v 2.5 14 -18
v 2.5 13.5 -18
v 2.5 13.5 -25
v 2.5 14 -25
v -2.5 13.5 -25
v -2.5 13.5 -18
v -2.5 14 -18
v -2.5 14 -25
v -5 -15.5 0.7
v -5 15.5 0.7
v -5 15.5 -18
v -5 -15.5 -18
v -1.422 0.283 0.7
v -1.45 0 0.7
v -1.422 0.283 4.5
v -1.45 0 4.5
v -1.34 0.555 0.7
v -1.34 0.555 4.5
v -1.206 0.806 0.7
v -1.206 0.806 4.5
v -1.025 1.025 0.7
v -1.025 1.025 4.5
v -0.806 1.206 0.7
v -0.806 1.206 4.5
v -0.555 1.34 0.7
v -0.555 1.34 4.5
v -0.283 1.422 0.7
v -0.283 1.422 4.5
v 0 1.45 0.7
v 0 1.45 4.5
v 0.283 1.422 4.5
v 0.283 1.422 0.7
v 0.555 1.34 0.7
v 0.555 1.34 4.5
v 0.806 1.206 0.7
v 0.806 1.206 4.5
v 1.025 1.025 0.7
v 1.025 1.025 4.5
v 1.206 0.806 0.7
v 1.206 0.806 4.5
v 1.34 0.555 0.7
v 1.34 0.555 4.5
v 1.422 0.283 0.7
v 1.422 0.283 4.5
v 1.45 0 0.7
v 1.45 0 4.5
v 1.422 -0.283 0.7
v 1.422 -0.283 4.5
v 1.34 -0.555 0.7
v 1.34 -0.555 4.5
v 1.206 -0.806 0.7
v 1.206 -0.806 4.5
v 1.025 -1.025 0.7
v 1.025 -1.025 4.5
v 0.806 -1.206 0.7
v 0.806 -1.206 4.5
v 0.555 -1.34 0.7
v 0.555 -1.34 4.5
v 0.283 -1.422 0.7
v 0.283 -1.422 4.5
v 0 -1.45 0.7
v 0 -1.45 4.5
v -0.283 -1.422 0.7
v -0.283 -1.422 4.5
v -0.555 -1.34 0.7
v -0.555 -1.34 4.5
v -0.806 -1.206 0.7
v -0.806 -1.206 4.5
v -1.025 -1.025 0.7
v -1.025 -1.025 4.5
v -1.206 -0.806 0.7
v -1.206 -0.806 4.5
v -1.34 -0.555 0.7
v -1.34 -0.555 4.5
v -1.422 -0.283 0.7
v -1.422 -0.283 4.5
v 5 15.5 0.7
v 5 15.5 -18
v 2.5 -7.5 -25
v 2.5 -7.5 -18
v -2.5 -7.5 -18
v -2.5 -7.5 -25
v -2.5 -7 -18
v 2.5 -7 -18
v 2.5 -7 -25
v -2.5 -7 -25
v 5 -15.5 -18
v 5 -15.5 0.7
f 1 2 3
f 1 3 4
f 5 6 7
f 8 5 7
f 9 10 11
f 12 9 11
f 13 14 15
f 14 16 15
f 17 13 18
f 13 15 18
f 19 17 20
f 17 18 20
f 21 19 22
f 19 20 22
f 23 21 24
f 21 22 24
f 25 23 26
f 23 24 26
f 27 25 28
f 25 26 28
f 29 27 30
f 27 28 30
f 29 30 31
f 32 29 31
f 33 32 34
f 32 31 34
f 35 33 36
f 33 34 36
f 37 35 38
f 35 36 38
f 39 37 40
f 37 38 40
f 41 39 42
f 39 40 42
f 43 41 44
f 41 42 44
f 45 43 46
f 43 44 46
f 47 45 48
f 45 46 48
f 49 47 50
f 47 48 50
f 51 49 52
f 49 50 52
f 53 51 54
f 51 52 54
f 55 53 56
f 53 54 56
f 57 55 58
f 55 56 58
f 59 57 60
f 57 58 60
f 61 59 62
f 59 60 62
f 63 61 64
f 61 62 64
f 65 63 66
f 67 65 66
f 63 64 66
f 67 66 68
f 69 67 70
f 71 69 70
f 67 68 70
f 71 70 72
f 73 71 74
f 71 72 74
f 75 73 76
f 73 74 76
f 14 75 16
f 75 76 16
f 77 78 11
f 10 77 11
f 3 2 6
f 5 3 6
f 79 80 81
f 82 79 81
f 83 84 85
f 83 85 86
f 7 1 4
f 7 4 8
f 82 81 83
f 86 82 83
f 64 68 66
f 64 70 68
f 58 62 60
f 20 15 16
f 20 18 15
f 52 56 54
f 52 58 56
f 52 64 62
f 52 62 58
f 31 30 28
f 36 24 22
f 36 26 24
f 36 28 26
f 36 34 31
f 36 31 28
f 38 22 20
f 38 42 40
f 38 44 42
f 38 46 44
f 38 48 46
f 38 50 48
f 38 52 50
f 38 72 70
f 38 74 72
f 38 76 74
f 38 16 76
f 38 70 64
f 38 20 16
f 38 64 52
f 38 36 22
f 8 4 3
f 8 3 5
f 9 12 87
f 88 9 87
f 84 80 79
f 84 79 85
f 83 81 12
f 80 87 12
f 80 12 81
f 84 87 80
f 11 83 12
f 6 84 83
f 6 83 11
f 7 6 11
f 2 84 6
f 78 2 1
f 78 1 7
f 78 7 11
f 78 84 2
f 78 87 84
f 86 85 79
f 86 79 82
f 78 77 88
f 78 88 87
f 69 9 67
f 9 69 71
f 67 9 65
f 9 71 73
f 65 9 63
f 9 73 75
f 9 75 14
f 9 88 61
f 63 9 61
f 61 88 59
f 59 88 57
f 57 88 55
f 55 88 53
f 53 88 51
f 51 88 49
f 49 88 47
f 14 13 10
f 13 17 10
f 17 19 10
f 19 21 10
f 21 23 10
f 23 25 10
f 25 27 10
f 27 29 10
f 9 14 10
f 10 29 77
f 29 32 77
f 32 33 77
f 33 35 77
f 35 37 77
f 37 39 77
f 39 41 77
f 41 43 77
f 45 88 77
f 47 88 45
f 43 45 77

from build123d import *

# Parameters (mm, degrees)
SKETCH1_W                      = 18.7
SKETCH1_H                      = 46
BOSS_EXTRUDE1_DEPTH            = 10
SKETCH2_W                      = 18
SKETCH2_H                      = 7.5
CUT_EXTRUDE1_DEPTH             = 31.870698081
SKETCH3_W                      = 18
SKETCH3_H                      = 7.5
CUT_EXTRUDE2_DEPTH             = 31.870698081
SKETCH4_W                      = 5
SKETCH4_H                      = 0.5
BOSS_EXTRUDE2_DEPTH            = 7
SKETCH5_W                      = 5
SKETCH5_H                      = 0.5
BOSS_EXTRUDE3_DEPTH            = 7
SKETCH6_W                      = 1.45
SKETCH6_H                      = 3.8
F_2_5_2_5_DIAMETER_HOLE1_D     = 2.5
F_2_5_2_5_DIAMETER_HOLE1_DEPTH = 25.7
FILLET1_R                      = 0.5
CUT_EXTRUDE3_DEPTH             = 35.336569427
CUT_EXTRUDE3_DEPTH_BACK        = 35.336569427


with BuildPart() as part:
    # Sketch1 → Boss-Extrude1 (new body)
    with BuildSketch(Plane(origin=(5, 0, 0), x_dir=(0, 0, -1), z_dir=(1, 0, 0))):
        with Locations((8.65, 0)):
            Rectangle(SKETCH1_W, SKETCH1_H)
    extrude(amount=-BOSS_EXTRUDE1_DEPTH)

    # Sketch2 → Cut-Extrude1 (cut, through all)
    with BuildSketch(Plane.ZY.offset(5)):
        with Locations((-9, -19.25)):
            Rectangle(SKETCH2_W, SKETCH2_H)
    extrude(amount=-CUT_EXTRUDE1_DEPTH, mode=Mode.SUBTRACT)

    # Sketch3 → Cut-Extrude2 (cut, through all)
    with BuildSketch(Plane.ZY.offset(5)):
        with Locations((-9, 19.25)):
            Rectangle(SKETCH3_W, SKETCH3_H)
    extrude(amount=-CUT_EXTRUDE2_DEPTH, mode=Mode.SUBTRACT)

    # Sketch4 → Boss-Extrude2 (add)
    with BuildSketch(Plane(origin=(0, 0, -18), x_dir=(-1, 0, 0), z_dir=(0, 0, -1))):
        with Locations((0, -7.25)):
            Rectangle(SKETCH4_W, SKETCH4_H)
    extrude(amount=BOSS_EXTRUDE2_DEPTH)

    # Sketch5 → Boss-Extrude3 (add)
    with BuildSketch(Plane(origin=(0, 0, -18), x_dir=(-1, 0, 0), z_dir=(0, 0, -1))):
        with Locations((0, 13.75)):
            Rectangle(SKETCH5_W, SKETCH5_H)
    extrude(amount=BOSS_EXTRUDE3_DEPTH)

    # Sketch6 → Revolve1 (revolve)
    with BuildSketch(Plane.XZ, mode=Mode.PRIVATE) as revolve1_sk:
        with Locations((0.725, 2.6)):
            Rectangle(SKETCH6_W, SKETCH6_H)
    revolve(revolve1_sk.sketch.rotate(Axis((0, 0, 4.5), (0, 0, -1)), 180), axis=Axis((0, 0, 4.5), (0, 0, -1)))

    # Ø2.5 (2.5) Diameter Hole1
    with Locations(Plane.XY.offset(0.7)):
        with Locations((0, -21), (0, 21)):
            Hole(F_2_5_2_5_DIAMETER_HOLE1_D / 2, depth=F_2_5_2_5_DIAMETER_HOLE1_DEPTH)

    # Fillet1
    fillet1_edges = [part.edges().sort_by_distance(p)[0] for p in [
        (5, 23, 0.35),
        (-5, 23, 0.35),
        (-5, -23, 0.35),
        (5, -23, 0.35),
    ]]
    fillet(fillet1_edges, radius=FILLET1_R)

    # Sketch9 → Cut-Extrude3 (cut, two sides: drawn at the far end of the back side and taken through both)
    with BuildSketch(Plane(origin=(0, 0, 0), x_dir=(-1, 0, 0), z_dir=(0, 0, -1)).offset(-CUT_EXTRUDE3_DEPTH_BACK)):
        with BuildLine():
            Line((4.5, 23), (-4.5, 23))
            ThreePointArc((-4.5, 23), (-4.853553391, 22.853553391), (-5, 22.5))
            Line((-5, 22.5), (-5, 15.5))
            Line((-5, 15.5), (5, 15.5))
            Line((5, 15.5), (5, 22.5))
            ThreePointArc((5, 22.5), (4.853553391, 22.853553391), (4.5, 23))
        make_face()
        with BuildLine():
            Line((-4.5, -23), (4.5, -23))
            ThreePointArc((4.5, -23), (4.853553391, -22.853553391), (5, -22.5))
            Line((5, -22.5), (5, -15.5))
            Line((5, -15.5), (-5, -15.5))
            Line((-5, -15.5), (-5, -22.5))
            ThreePointArc((-5, -22.5), (-4.853553391, -22.853553391), (-4.5, -23))
        make_face()
    extrude(amount=CUT_EXTRUDE3_DEPTH + CUT_EXTRUDE3_DEPTH_BACK, mode=Mode.SUBTRACT)


solid = part.part
